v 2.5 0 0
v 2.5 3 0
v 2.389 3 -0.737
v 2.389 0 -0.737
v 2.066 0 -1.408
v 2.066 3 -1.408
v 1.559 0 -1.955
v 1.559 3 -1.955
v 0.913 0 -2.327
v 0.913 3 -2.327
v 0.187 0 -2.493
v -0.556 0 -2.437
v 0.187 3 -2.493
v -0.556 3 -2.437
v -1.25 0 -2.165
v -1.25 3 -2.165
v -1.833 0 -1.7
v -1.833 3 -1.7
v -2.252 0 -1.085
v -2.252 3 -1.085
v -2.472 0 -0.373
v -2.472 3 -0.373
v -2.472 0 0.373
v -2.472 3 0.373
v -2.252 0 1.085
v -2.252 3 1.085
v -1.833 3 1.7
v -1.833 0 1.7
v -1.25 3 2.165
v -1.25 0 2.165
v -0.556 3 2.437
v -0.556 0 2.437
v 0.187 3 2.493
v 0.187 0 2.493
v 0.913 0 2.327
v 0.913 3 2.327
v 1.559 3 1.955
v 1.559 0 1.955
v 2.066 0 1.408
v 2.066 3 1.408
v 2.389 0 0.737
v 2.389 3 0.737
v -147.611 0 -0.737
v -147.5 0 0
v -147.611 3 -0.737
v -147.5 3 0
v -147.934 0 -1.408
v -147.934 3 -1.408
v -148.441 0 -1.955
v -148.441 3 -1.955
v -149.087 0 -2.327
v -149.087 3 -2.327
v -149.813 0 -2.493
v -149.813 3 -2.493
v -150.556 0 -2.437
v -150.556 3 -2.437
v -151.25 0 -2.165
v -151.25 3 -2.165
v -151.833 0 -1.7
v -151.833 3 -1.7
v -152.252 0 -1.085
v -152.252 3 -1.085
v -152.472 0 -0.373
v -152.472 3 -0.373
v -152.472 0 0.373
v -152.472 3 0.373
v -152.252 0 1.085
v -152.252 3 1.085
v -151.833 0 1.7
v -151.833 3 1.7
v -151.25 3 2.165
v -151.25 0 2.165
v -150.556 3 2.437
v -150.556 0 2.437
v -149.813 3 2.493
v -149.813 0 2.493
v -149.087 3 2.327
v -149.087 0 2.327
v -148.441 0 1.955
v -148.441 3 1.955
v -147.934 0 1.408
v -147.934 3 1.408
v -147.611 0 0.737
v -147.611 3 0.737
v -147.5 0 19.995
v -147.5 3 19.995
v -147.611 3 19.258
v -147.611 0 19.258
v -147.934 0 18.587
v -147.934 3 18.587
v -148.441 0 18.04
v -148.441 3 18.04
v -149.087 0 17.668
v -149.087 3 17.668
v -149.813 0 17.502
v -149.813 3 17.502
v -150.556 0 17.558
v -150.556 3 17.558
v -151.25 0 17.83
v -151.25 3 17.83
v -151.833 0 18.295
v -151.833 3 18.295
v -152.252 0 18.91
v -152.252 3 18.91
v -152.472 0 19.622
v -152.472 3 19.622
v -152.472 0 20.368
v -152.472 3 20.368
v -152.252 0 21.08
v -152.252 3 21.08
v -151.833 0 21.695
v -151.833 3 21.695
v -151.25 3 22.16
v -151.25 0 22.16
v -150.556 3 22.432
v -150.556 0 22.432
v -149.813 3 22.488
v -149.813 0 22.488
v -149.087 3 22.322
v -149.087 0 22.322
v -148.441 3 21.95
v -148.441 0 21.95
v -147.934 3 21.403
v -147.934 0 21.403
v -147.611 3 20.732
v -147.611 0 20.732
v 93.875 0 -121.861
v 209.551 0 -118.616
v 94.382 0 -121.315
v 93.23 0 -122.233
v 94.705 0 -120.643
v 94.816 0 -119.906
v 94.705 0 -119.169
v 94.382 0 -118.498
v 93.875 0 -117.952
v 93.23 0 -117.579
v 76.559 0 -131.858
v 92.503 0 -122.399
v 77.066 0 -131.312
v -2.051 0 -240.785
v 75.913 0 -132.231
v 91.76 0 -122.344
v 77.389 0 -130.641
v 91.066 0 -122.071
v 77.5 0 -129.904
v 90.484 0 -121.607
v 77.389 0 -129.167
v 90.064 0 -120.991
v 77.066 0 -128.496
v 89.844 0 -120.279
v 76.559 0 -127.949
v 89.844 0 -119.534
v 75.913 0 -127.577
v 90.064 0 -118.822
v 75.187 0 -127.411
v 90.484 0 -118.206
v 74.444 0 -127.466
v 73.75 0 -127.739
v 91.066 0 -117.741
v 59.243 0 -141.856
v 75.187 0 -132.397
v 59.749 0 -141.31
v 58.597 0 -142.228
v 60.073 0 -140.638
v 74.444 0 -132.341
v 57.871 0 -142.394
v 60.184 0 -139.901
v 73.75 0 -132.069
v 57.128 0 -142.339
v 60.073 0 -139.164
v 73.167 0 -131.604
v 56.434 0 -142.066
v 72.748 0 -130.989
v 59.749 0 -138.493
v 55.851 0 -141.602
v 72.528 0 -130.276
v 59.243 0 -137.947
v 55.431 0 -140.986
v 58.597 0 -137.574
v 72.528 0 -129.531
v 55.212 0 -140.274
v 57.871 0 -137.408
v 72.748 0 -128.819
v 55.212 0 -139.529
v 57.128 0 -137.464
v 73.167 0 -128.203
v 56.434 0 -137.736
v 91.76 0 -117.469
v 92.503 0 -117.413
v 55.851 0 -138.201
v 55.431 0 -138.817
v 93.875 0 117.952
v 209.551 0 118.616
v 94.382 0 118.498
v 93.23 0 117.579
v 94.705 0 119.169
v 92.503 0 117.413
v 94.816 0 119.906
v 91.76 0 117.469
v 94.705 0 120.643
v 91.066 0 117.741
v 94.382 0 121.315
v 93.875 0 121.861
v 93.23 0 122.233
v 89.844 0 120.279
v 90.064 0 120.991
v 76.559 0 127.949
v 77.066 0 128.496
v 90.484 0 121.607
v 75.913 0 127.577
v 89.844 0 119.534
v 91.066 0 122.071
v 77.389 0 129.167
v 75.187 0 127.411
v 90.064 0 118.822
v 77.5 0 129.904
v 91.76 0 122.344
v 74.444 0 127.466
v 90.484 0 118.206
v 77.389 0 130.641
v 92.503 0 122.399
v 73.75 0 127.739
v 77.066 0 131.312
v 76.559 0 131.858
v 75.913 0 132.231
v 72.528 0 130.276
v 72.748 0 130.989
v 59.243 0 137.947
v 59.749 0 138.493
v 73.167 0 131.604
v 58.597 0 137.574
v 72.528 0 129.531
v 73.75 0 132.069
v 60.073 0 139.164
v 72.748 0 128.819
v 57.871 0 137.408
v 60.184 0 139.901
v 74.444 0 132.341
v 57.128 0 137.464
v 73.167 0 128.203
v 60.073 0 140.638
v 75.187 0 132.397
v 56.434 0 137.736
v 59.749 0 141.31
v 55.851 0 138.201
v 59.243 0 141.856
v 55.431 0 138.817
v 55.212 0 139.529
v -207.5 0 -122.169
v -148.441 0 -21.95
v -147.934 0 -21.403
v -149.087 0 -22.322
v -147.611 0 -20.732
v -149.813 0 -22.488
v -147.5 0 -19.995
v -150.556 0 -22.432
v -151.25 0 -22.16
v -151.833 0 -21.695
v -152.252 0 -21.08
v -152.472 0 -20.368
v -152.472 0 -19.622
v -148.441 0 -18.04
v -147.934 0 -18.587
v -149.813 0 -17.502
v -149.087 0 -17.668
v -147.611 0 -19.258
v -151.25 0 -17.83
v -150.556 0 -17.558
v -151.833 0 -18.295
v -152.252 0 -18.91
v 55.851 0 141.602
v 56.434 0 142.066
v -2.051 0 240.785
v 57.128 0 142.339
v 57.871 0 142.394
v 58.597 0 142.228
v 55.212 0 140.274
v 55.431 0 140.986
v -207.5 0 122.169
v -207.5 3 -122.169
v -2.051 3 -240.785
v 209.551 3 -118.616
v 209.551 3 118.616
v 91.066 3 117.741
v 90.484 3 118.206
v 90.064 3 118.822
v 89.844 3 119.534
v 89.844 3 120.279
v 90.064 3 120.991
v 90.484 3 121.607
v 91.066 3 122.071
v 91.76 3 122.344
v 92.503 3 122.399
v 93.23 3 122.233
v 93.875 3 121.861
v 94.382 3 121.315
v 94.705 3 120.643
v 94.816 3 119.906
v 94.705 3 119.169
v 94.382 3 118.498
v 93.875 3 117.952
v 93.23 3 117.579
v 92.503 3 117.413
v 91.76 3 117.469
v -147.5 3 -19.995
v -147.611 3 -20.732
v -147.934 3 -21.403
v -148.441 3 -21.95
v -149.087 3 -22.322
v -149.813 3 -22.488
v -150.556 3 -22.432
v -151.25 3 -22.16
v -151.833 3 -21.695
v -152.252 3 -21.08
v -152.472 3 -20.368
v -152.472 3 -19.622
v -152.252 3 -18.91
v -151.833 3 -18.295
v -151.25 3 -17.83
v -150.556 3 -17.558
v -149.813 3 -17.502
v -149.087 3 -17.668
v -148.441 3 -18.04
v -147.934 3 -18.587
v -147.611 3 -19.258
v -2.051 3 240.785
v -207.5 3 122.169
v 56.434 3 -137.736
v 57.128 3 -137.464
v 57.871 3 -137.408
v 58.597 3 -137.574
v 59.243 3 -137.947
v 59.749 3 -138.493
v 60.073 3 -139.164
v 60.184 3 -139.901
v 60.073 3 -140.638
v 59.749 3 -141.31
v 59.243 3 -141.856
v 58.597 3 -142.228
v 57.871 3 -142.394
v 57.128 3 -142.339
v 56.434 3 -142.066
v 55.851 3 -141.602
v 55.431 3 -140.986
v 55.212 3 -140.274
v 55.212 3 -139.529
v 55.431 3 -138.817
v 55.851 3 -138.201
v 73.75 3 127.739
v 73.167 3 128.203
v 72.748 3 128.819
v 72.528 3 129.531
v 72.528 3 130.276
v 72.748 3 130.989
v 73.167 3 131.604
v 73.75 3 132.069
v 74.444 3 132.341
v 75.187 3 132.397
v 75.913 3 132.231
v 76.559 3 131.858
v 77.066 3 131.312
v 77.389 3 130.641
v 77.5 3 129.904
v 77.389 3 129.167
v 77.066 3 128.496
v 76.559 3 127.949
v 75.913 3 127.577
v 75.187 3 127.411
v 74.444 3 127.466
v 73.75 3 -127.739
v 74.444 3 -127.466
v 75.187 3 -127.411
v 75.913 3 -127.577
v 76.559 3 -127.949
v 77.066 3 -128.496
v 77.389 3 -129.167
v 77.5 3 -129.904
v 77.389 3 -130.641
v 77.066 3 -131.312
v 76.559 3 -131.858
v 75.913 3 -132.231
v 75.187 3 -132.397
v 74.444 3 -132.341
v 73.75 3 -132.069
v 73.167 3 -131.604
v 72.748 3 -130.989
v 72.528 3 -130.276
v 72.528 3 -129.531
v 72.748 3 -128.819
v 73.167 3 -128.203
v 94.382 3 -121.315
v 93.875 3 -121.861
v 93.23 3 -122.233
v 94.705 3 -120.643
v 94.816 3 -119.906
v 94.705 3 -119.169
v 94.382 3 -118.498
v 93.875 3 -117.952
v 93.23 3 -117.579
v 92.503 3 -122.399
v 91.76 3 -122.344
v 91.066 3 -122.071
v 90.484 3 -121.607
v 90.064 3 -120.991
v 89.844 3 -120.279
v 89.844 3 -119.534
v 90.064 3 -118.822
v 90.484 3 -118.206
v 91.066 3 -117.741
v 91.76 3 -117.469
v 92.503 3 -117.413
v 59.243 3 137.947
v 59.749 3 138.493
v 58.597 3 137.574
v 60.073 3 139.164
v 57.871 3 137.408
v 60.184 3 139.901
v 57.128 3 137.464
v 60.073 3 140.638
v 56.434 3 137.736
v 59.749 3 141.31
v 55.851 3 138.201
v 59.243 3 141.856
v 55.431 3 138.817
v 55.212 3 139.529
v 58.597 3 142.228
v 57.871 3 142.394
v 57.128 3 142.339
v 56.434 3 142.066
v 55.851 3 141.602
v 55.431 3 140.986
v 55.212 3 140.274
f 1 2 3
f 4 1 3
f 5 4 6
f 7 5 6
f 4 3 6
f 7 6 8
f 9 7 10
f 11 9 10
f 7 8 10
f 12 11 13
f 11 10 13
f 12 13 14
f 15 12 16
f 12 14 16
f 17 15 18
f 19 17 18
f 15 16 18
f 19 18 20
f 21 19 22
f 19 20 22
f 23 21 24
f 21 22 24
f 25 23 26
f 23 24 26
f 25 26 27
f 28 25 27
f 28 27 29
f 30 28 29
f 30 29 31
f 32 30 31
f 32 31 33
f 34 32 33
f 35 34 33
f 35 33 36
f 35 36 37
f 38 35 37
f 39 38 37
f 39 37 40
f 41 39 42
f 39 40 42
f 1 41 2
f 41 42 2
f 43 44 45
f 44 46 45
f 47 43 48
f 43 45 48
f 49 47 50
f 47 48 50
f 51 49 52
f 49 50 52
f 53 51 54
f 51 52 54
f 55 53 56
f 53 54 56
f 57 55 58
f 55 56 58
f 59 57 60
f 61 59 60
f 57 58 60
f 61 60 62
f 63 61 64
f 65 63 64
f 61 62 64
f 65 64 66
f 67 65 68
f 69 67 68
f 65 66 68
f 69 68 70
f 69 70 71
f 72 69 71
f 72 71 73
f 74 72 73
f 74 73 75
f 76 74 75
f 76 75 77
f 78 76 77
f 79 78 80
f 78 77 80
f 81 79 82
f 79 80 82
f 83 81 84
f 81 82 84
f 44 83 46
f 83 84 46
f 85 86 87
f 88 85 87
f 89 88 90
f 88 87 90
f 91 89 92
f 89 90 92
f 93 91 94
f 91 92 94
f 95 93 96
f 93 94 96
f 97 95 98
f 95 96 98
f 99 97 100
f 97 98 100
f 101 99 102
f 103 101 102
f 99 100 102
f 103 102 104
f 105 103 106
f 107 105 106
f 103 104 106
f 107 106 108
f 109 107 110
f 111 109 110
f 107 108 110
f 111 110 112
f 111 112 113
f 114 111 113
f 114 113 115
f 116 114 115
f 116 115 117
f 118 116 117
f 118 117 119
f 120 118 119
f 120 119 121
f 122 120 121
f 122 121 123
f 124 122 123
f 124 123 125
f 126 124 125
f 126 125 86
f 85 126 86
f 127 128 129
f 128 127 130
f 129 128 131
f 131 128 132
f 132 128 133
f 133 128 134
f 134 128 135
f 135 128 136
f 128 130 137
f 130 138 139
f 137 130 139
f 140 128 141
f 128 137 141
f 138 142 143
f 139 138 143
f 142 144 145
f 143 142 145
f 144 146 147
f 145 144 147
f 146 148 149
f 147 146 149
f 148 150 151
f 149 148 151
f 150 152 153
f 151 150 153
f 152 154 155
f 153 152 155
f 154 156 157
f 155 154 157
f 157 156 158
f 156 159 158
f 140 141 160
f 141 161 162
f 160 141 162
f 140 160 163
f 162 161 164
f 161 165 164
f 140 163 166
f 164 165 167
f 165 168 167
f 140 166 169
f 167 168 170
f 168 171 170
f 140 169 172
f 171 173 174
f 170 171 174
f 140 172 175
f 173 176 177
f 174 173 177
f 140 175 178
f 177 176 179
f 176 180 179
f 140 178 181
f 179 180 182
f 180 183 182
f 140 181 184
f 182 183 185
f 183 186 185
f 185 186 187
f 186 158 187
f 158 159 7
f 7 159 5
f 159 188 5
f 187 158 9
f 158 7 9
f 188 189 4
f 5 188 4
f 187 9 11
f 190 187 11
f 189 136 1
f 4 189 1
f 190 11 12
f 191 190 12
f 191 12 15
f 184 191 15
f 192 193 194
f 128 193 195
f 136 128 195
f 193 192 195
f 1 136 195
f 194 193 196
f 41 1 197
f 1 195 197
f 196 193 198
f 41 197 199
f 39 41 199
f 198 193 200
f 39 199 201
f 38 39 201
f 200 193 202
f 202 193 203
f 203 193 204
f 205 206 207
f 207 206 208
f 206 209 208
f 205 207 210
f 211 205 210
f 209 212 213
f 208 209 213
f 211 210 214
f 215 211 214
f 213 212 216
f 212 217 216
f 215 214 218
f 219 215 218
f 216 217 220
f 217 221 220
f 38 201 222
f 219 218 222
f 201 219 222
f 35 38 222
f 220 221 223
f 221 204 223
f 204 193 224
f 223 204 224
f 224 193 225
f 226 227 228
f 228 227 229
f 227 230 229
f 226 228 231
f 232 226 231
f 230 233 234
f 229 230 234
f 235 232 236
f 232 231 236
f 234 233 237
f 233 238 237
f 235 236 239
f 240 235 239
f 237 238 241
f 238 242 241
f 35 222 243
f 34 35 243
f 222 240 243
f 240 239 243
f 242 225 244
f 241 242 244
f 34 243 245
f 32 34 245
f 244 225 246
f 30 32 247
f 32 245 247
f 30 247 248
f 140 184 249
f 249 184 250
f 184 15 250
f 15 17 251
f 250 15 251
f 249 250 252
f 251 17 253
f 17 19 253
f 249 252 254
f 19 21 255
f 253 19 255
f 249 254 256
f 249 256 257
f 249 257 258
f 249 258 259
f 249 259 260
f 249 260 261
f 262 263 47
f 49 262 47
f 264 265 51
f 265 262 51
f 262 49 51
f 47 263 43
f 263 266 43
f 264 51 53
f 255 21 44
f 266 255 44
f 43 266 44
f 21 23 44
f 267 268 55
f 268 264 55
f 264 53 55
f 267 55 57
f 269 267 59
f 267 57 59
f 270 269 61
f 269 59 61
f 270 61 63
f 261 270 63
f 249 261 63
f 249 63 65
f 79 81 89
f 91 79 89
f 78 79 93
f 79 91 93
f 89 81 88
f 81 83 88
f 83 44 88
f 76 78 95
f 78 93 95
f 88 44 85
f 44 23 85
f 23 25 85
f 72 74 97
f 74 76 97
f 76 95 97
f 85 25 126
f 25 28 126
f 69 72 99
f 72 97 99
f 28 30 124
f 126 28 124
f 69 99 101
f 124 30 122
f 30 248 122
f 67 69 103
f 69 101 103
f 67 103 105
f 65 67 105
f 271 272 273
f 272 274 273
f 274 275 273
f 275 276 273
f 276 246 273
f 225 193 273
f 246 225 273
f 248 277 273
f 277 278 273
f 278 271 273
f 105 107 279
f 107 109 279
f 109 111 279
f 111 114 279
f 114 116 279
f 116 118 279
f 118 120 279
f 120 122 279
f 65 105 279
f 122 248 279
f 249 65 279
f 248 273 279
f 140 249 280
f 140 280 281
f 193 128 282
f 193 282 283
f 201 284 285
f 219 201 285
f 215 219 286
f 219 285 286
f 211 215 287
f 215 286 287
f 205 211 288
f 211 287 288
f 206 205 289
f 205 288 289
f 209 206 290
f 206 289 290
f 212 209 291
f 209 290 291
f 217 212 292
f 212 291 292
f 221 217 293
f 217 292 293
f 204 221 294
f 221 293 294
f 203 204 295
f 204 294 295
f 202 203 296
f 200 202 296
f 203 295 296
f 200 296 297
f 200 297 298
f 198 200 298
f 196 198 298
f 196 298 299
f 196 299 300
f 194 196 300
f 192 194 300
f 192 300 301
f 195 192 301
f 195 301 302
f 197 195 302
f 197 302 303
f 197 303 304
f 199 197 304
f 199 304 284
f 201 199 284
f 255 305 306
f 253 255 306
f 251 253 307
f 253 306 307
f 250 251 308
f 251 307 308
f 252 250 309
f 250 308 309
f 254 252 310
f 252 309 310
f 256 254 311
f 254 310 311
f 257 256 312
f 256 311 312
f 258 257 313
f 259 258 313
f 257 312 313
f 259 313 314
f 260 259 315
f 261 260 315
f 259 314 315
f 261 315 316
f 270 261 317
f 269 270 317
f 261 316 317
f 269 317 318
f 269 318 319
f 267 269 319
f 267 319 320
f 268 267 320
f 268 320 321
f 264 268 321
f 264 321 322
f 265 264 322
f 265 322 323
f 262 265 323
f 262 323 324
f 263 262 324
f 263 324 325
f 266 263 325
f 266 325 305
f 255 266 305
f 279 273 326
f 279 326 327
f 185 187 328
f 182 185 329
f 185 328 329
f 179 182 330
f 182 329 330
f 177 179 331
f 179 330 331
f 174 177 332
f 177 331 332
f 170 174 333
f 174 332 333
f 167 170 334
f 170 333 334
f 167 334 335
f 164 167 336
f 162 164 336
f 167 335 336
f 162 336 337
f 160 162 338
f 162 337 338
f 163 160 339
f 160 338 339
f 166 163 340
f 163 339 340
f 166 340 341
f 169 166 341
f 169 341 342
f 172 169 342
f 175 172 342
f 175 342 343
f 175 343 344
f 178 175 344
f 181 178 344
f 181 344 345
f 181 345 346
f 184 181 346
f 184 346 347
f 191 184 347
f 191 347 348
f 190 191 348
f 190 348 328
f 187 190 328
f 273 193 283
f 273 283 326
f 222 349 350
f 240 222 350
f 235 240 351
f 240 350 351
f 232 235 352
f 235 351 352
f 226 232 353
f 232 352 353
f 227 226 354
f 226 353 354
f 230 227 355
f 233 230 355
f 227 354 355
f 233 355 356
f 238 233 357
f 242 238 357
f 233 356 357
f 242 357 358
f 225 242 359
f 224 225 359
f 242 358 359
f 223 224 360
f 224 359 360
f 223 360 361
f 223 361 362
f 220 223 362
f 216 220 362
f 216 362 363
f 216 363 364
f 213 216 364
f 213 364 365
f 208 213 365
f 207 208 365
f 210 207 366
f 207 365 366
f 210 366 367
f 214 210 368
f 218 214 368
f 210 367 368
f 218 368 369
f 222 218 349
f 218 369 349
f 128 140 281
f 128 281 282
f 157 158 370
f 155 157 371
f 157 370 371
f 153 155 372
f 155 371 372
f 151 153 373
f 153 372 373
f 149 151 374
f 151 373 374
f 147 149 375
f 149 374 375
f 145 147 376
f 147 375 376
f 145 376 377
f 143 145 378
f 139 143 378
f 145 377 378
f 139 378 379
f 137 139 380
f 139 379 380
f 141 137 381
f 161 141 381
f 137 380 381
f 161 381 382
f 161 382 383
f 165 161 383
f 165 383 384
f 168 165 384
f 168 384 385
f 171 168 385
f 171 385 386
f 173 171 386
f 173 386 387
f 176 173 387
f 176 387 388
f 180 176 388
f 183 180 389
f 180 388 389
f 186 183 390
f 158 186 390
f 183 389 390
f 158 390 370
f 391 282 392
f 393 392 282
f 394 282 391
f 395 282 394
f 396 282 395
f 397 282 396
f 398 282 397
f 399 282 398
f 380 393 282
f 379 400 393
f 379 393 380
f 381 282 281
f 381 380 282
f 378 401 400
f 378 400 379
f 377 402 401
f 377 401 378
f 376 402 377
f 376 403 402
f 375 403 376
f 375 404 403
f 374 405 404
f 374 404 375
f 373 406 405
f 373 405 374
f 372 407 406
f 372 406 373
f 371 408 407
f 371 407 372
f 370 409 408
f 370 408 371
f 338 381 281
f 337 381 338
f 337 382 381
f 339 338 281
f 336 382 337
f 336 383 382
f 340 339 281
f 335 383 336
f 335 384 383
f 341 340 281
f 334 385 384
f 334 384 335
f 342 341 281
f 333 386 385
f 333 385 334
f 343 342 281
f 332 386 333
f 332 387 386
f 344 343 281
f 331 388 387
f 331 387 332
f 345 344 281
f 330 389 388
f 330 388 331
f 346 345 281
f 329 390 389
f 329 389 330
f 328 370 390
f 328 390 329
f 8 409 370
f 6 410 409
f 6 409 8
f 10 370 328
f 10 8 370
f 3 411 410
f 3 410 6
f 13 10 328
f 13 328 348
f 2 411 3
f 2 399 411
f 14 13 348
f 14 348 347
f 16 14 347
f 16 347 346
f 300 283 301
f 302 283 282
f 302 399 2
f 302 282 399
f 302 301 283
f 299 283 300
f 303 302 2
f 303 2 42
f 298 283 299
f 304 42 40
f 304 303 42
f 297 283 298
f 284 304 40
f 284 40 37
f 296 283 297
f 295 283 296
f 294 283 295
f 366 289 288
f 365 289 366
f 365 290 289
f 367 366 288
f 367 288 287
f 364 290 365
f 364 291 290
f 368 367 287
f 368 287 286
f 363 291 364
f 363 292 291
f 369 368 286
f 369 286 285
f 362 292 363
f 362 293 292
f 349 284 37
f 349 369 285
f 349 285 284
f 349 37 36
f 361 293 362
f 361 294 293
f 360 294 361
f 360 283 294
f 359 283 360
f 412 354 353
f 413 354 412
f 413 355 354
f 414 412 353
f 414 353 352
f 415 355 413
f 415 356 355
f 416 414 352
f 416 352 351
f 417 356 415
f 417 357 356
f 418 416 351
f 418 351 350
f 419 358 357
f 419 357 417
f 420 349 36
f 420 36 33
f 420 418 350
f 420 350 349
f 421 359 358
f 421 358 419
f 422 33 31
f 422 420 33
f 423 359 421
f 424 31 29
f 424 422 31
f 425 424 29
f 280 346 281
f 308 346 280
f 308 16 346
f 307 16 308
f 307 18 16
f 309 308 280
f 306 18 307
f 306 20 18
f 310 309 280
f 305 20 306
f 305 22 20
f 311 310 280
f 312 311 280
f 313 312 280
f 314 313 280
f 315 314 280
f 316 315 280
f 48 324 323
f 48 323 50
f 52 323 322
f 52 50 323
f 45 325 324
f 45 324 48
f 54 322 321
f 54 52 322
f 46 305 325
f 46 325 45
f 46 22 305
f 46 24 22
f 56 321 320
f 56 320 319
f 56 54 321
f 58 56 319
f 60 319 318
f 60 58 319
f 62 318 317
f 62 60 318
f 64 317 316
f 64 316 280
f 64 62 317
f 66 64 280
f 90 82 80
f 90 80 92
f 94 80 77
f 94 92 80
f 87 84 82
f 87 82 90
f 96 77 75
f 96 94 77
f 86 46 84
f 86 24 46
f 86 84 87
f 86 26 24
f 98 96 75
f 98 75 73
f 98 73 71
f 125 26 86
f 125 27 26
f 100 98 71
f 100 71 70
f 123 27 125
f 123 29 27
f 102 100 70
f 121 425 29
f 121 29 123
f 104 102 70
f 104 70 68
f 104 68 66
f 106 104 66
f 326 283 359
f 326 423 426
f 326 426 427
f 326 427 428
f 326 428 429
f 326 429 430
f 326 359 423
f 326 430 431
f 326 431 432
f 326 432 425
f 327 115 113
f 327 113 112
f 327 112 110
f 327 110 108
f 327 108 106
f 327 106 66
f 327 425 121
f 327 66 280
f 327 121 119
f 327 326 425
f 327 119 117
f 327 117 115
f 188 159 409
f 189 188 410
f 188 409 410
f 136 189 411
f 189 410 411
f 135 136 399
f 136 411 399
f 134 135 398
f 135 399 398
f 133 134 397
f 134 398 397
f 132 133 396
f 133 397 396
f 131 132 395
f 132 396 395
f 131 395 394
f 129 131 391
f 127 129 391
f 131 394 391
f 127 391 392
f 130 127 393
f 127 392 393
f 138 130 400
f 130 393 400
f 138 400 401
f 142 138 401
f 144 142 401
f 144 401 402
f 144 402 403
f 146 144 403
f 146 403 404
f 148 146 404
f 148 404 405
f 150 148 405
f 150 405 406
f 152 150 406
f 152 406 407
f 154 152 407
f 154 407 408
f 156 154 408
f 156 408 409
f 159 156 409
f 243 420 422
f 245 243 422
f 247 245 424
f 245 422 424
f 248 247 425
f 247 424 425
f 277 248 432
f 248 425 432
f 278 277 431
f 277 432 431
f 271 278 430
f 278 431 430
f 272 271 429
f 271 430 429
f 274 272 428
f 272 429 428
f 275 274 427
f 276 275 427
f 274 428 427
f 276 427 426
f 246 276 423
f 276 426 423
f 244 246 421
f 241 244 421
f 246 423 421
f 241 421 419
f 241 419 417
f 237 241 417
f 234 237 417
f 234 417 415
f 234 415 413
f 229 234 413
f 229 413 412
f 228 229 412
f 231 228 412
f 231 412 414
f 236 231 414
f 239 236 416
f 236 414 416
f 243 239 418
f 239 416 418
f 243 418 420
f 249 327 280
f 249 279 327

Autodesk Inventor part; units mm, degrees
ref_plane "YZ Plane" through (0, 0, 0) normal (1, 0, 0) x (0, 1, 0)
ref_plane "XZ Plane" through (0, 0, 0) normal (0, 1, 0) x (-1, 0, 0)
ref_plane "XY Plane" through (0, 0, 0) normal (0, 0, 1) x (1, 0, 0)
sketch "Sketch1" plane through (0, 0, 0) normal (0, 1, 0) x (-1, 0, 0)
  circle A0 centre (0, 0) radius 37.5
  line L0 (0, 0) -> (37.5, 0)
  line L1 (37.5, 0) -> (-18.75, 32.476)
  line L2 (37.5, 0) -> (102.4519, 0) construction
  line L3 (-18.75, 32.476) -> (-18.75, -32.476)
  line L4 (37.5, 0) -> (-18.75, -32.476)
  line L5 (37.5, 0) -> (37.5, 160)
  line L6 (37.5, 160) -> (37.5, 180)
  circle A1 centre (37.5, 180) radius 2.25
  circle A2 centre (37.5, 200) radius 2.25
  circle A3 centre (57.5, 180) radius 2.25
  circle A4 centre (57.5, 200) radius 2.25
  line L7 (57.5, 180) -> (67.5, 180)
  line L8 (67.5, 180) -> (67.5, 170)
  line L9 (67.5, 170) -> (7.5, 170)
  line L10 (7.5, 170) -> (7.5, 210)
  line L11 (7.5, 210) -> (67.5, 210)
  line L12 (67.5, 210) -> (67.5, 170)
  line L13 (143.4743, -91.4952) -> (178.1153, -111.4952)
  line L14 (178.1153, -111.4952) -> (148.1153, -163.4567)
  circle A5 centre (154.4551, -132.476) radius 2.25
  circle A6 centre (144.4551, -149.7965) radius 2.25
  line L15 (148.1153, -163.4567) -> (113.4743, -143.4567)
  line L16 (113.4743, -143.4567) -> (143.4743, -91.4952)
  circle A7 centre (127.1346, -139.7965) radius 2.25
  circle A8 centre (137.1346, -122.476) radius 2.25
  circle A9 centre (0, 0) radius 37.5
  line L17 (-150.9743, -78.5048) -> (-185.6153, -98.5048)
  line L18 (-185.6153, -98.5048) -> (-215.6153, -46.5433)
  circle A10 centre (-191.9551, -67.524) radius 2.25
  circle A11 centre (-201.9551, -50.2035) radius 2.25
  line L19 (-215.6153, -46.5433) -> (-180.9743, -26.5433)
  line L20 (-180.9743, -26.5433) -> (-150.9743, -78.5048)
  circle A12 centre (-184.6346, -40.2035) radius 2.25
  circle A13 centre (-174.6346, -57.524) radius 2.25
  circle A14 centre (0, 0) radius 37.5
  circle A15 centre (0, 0) radius 48
  line L21 (-215.6153, -46.5433) -> (-155.6153, -46.5433) construction
  line L22 (67.5, 210) -> (127.5, 210) construction
  line L23 (67.5, 210) -> (15, 210) construction
  line L24 (-215.6153, -46.5433) -> (-185.6153, -46.5433) construction
  line L25 (67.5, 210) -> (22.5, 210) construction
  line L26 (-215.6153, -46.5433) -> (-170.6153, -46.5433) construction
  line L27 (-215.6153, -46.5433) -> (-170.6153, -46.5433) construction
  line L28 (-18.75, -32.476) -> (-41.25, -71.4471)
  line L29 (-18.75, -32.476) -> (26.25, -32.476) construction
  line L30 (-41.25, -71.4471) -> (-84.5513, -46.4471)
  line L31 (-41.25, -71.4471) -> (2.0513, -96.4471)
  line L32 (-41.25, -71.4471) -> (8.75, -71.4471) construction
  line L33 (82.5, 0) -> (82.5, -50)
  line L34 (82.5, 0) -> (82.5, 50)
  line L35 (-41.25, 71.4471) -> (2.0513, 96.4471)
  line L36 (-41.25, 71.4471) -> (-84.5513, 46.4471)
  line L37 (-84.5513, -46.4471) -> (-84.5513, 46.4471)
  line L38 (82.5, -50) -> (2.0513, -96.4471)
  line L39 (82.5, 50) -> (2.0513, 96.4471)
  line L40 (2.0513, -240.7847) -> (-103.75, -179.7003)
  line L41 (-103.75, -179.7003) -> (-209.5513, -118.6159)
  line L42 (-209.5513, -118.6159) -> (-209.5513, 118.6159)
  line L43 (-209.5513, 118.6159) -> (-103.75, 179.7003)
  line L44 (-103.75, 179.7003) -> (2.0513, 240.7847)
  line L45 (2.0513, 240.7847) -> (207.5, 122.1688)
  line L46 (207.5, 122.1688) -> (207.5, 0)
  line L47 (207.5, 0) -> (207.5, -122.1688)
  line L48 (207.5, -122.1688) -> (2.0513, -240.7847)
  point P0 (37.5, 0)
  point P1 (-18.75, 32.476)
  point P2 (37.5, 0)
  dimension "d0" = 75
  dimension "d1" = 37.5
  dimension "d2" = 150
  dimension "d3" = 160
  dimension "d4" = 20
  dimension "d5" = 4.5
  dimension "d8" = 20
  dimension "d11" = 20
  dimension "d14" = 10
  dimension "d15" = 10
  dimension "d16" = 60
  dimension "d17" = 40
  dimension "d20" = 360
  dimension "d22" = 96
  dimension "d45" = 45
  dimension "d46" = 120
  dimension "d47" = 50
  dimension "d48" = 90
  dimension "d49" = 50
  dimension "d50" = 30
  dimension "d53" = 360
  dimension "d72" = 125
ref_plane "Work Plane2" through (0, 3, 0) normal (0, 1, 0) x (1, 0, 0)
ref_plane "Work Plane1" through (0, 3, 0) normal (0, 1, 0) x (1, 0, 0)
extrude "Extrusion8" add sketch "Sketch1" along normal blind 3 contours L1 A0 | L5 A15 L28 A0 | L4 L3 L1 | A0 L4 | A0 L28 A15 L5 | L3 A0 | A15 L28 L30 L37 L36 L35 L39 L5 | L5 L39 L34 L33 L38 L31 L28 A15 | L9 L8 L12 L45 L46 L47 L48 L14 L13 L16 L15 L40 L41 L42 L18 L17 L20 L19 L43 L44 L11 L10 | A1 | A3 | L9 L10 L11 L45 L12 L8 | L48 L15 L16 L13 L14 | L19 L20 L17 L18 L42 | A2 | A4 | A5 | A6 | A7 | A8 | A10 | A11 | A12 | A13
sketch "Sketch4" plane through (0, 3, 0) normal (0, 1, 0) x (1, 0, 0)
  line L0 (0, 0) -> (-150, 0)
  circle A0 centre (0, 0) radius 2.5
  line L1 (-150, 0) -> (-150, -19.995)
  circle A1 centre (-150, -19.995) radius 2.5
  line L2 (-150, 0) -> (-150, 19.995)
  circle A2 centre (-150, 19.995) radius 2.5
  circle A3 centre (-150, 0) radius 2.5
  dimension "d79" = 150
  dimension "d80" = 5
  dimension "d81" = 19.995
  dimension "d82" = 5
  dimension "d83" = 19.995
  dimension "d84" = 5
  dimension "d90" = 5
extrude "Extrusion10" cut sketch "Sketch4" against normal blind 3
pattern_circular "Circular Pattern2" count 3 over 360 about axis through (0, 3, 0) along (0, -1, 0) of "Extrusion10"
sketch "Sketch5" plane through (0, 3, 0) normal (0, 1, 0) x (1, 0, 0)
  circle A0 centre (0, 0) radius 100
  circle A1 centre (0, 0) radius 2.5 projected
  line L0 (0, 0) -> (100, 0)
  line L1 (100, 0) -> (100, 20)
  line L2 (0, 0) -> (50, 86.6025)
  line L3 (0, 0) -> (100, 0) construction
  line L4 (50, 86.6025) -> (67.3205, 76.6025)
  dimension "d96" = 200
  dimension "d97" = 20
  dimension "d98" = 60
  dimension "d99" = 20
properties part number "Delta_Top" material "Glass"
